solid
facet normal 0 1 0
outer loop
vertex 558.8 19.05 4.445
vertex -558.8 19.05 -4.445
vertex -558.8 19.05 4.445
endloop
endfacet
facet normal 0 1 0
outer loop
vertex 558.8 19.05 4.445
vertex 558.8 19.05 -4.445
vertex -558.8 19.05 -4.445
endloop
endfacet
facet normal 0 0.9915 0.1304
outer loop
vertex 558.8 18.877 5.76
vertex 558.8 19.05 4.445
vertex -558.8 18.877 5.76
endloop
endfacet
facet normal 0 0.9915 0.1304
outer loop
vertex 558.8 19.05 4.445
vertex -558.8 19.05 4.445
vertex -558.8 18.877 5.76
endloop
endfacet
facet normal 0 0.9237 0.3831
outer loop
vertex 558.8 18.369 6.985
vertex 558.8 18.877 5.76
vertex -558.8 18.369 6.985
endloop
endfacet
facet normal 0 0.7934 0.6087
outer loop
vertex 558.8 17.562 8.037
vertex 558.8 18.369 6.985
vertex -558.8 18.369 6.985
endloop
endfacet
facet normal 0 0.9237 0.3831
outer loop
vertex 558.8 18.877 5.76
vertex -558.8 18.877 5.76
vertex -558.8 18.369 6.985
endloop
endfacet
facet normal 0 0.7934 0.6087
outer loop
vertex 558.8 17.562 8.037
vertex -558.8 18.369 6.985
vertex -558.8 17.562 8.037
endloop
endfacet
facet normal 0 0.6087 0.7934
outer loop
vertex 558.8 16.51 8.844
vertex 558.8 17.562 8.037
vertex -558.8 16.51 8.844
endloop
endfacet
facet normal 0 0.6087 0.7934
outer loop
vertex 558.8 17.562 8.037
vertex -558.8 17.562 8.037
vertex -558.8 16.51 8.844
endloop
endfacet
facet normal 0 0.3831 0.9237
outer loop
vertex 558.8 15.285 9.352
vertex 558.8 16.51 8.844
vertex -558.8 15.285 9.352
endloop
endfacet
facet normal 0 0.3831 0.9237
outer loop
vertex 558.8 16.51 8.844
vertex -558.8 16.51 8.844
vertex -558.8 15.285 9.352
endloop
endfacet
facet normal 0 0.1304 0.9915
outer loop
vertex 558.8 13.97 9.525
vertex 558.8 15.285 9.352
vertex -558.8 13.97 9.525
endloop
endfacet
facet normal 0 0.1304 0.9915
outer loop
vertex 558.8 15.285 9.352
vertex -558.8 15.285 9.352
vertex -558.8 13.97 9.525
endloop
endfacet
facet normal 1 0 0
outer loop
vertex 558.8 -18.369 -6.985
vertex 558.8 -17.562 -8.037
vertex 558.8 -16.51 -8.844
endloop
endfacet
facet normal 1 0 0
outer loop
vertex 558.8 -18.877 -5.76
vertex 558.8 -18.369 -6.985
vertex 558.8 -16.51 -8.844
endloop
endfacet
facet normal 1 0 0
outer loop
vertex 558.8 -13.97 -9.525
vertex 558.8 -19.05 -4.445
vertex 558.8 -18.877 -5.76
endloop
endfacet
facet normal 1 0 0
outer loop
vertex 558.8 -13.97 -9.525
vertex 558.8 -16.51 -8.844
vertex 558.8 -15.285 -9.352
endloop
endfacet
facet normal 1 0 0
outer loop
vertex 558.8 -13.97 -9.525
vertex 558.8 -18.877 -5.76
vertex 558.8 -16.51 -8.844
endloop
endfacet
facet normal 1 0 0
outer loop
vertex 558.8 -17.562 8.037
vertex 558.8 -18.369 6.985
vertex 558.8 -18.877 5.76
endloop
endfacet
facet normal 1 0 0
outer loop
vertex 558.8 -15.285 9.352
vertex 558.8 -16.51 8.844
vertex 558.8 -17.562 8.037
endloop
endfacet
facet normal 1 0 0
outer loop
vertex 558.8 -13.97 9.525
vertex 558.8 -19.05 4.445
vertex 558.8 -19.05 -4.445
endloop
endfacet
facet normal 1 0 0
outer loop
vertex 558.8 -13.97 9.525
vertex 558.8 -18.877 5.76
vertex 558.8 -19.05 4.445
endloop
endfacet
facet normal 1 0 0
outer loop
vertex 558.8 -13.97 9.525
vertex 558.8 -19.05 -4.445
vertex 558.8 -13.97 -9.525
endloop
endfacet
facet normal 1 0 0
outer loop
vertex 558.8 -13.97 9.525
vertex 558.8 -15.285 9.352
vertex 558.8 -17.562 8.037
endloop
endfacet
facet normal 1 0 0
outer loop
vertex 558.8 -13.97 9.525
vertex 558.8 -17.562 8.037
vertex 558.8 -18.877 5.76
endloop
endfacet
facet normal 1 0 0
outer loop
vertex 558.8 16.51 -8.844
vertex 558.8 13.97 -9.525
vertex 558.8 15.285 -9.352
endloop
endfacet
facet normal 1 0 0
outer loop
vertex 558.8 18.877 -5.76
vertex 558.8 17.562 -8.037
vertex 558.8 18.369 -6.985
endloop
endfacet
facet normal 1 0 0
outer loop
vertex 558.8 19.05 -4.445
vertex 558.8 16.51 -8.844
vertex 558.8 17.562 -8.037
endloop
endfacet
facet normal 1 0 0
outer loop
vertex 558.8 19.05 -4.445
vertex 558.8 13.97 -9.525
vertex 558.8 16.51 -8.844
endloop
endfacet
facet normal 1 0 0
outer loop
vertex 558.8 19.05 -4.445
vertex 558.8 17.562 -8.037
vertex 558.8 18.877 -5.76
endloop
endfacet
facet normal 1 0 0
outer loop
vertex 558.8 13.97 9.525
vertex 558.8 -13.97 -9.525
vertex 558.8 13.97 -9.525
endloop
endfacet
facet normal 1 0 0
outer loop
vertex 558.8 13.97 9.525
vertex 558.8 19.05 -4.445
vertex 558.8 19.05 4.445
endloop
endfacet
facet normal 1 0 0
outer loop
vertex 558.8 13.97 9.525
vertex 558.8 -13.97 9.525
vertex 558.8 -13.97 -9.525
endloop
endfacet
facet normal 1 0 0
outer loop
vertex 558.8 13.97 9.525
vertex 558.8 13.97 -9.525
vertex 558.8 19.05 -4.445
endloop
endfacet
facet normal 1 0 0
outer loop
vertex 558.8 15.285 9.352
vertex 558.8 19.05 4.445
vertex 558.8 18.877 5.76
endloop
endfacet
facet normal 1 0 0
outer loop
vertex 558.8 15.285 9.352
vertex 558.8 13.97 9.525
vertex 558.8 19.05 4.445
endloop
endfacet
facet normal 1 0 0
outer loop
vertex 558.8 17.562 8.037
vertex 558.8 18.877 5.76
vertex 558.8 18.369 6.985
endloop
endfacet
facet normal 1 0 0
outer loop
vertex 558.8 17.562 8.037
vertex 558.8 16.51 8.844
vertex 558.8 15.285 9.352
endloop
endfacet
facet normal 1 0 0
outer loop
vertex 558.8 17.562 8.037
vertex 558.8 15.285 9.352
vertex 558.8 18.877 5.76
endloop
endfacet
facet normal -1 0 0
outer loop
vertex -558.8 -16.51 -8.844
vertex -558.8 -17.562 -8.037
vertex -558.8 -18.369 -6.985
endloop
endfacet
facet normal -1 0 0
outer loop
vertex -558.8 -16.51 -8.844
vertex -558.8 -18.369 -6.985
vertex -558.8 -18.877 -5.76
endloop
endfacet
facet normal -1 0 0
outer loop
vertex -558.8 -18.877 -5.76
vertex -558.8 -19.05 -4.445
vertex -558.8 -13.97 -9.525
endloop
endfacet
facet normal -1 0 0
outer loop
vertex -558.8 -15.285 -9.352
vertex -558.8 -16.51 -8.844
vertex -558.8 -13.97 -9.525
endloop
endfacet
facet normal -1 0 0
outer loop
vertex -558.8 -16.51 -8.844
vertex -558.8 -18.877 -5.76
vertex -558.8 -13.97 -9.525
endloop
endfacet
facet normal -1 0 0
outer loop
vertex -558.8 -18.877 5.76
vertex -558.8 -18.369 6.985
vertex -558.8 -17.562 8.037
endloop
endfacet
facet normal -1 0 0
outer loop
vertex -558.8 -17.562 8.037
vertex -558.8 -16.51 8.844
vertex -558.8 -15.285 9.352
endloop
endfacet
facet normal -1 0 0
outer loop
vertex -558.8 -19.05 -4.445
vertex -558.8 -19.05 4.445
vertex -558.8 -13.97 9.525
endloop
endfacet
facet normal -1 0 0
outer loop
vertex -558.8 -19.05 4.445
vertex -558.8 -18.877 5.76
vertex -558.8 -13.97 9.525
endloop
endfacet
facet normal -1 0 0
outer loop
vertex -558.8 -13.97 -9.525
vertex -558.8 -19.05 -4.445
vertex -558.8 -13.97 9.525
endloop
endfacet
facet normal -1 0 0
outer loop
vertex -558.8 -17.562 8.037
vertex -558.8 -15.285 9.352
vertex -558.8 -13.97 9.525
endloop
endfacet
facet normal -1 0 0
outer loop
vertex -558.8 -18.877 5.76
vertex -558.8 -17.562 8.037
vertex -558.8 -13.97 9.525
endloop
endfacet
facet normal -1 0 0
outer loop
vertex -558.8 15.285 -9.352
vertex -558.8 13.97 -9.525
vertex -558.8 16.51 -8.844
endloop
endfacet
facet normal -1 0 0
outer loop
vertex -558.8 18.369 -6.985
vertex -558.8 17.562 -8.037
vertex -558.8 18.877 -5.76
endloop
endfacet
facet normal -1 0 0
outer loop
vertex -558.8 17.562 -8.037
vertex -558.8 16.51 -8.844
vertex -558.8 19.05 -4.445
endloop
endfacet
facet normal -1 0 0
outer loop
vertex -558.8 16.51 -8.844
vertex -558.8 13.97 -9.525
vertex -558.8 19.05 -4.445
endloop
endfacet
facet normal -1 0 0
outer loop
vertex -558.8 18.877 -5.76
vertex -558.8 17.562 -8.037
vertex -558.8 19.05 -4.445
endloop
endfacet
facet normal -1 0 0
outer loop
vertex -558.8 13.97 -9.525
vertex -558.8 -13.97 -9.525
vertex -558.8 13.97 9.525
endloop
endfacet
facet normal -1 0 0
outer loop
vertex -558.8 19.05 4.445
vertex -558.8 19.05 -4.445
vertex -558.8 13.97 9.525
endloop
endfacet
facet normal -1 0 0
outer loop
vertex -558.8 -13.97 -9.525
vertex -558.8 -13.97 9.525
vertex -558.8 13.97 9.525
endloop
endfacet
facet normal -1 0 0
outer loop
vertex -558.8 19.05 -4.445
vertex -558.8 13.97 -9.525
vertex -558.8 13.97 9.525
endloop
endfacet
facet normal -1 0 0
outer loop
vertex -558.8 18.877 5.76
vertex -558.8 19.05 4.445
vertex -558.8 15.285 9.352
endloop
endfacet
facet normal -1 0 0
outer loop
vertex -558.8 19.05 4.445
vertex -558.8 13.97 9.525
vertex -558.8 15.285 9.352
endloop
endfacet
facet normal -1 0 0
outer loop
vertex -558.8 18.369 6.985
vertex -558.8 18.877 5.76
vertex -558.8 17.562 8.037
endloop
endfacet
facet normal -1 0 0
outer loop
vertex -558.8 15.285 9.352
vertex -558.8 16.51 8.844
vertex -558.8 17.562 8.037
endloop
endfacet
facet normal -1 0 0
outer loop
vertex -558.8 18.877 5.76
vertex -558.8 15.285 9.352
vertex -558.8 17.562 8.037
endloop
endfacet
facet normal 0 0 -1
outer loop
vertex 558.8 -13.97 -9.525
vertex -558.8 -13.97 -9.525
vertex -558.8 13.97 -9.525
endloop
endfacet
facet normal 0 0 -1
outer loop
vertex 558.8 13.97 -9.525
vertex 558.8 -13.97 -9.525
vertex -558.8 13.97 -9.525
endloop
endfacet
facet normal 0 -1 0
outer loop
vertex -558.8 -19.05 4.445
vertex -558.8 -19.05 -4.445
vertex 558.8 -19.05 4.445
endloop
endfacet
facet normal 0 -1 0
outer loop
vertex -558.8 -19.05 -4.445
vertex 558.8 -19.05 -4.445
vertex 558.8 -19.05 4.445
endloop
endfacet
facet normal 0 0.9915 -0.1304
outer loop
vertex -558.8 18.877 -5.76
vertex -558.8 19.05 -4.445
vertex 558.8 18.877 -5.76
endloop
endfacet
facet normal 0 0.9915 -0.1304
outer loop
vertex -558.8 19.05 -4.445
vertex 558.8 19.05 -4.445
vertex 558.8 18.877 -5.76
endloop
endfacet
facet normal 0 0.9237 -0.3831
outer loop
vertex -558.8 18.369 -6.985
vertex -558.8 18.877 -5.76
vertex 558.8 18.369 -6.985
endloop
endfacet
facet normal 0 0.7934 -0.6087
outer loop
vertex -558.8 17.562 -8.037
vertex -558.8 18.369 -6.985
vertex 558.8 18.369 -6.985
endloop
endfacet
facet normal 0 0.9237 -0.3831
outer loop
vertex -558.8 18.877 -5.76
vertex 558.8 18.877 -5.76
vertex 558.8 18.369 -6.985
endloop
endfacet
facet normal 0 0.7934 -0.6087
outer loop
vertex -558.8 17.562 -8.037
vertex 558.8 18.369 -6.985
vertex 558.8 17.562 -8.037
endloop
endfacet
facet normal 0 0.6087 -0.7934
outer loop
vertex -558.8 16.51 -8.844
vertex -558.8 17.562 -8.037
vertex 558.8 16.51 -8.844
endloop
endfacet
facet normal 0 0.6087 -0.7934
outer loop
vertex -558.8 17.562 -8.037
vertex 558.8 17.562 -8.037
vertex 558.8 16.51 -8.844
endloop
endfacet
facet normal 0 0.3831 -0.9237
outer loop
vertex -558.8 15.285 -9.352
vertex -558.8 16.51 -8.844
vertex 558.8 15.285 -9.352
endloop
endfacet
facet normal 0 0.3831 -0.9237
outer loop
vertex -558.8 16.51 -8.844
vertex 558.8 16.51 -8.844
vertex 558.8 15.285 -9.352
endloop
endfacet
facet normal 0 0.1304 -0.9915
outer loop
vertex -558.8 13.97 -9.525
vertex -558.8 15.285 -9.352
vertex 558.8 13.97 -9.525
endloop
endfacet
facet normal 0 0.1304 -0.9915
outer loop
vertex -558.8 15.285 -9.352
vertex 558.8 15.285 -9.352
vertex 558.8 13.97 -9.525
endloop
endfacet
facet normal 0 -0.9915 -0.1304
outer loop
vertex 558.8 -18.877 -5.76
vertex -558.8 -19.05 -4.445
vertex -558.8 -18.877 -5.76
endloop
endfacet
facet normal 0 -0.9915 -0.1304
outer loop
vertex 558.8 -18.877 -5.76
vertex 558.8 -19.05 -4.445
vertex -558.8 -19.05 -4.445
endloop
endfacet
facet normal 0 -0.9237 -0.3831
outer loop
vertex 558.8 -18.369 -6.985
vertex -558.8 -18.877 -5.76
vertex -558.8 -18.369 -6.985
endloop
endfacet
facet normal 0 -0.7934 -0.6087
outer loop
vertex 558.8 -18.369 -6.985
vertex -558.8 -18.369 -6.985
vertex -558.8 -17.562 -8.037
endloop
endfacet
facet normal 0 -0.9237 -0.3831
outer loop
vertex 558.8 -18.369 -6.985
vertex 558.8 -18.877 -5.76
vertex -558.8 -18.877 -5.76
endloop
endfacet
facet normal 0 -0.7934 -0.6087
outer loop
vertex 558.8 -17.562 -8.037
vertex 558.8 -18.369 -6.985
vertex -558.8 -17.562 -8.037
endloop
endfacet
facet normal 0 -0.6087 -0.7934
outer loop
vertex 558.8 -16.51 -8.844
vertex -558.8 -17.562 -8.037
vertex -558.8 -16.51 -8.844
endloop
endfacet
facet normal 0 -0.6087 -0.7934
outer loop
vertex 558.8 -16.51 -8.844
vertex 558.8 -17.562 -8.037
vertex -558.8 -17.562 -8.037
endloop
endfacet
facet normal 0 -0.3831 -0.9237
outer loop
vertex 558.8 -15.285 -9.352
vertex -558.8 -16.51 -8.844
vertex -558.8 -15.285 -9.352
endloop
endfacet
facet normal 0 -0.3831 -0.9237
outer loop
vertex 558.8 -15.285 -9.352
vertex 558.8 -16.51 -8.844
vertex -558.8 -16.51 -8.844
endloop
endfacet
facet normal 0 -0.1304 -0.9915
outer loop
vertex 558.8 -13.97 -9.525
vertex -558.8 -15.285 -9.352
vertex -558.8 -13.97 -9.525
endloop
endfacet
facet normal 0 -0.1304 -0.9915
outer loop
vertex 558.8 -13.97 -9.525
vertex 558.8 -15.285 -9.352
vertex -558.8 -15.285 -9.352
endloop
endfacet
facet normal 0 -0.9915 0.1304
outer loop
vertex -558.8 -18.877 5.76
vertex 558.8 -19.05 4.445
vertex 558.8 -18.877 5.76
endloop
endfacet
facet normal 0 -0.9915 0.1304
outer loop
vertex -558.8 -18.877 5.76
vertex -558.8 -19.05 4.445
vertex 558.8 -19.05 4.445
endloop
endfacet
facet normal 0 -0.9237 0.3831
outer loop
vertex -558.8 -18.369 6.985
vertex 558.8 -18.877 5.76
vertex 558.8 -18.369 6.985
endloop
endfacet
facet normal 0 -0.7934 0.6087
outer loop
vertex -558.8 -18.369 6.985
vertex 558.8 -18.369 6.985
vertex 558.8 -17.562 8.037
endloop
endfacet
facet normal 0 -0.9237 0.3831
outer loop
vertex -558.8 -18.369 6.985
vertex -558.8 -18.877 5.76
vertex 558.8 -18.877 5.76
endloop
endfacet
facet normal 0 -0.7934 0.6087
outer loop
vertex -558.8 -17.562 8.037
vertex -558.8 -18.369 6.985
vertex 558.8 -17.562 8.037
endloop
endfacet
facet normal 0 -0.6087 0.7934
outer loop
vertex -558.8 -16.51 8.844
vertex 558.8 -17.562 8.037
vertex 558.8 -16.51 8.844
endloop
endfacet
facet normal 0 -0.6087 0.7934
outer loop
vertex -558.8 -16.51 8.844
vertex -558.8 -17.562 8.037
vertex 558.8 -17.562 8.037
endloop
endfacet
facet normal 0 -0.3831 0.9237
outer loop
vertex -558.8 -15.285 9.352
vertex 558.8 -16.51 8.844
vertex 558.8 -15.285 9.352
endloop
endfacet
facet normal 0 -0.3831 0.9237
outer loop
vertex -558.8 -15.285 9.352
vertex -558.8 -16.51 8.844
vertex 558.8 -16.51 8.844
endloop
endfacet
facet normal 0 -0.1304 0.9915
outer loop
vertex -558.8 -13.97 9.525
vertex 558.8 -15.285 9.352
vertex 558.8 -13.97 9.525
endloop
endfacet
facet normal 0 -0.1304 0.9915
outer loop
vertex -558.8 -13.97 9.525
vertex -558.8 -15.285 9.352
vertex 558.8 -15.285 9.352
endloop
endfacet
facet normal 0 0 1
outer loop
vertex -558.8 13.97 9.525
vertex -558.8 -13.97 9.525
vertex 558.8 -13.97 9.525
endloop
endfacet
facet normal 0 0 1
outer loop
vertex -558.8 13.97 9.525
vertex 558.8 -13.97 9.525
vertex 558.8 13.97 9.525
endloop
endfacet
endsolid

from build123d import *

# Parameters (mm, degrees)
F0_W     = 38.1
F0_H     = 19.05
F1_DEPTH = 558.8
F2_R     = 5.08


with BuildPart() as f1:
    # F0 (on Right) → F1 (new body, symmetric)
    with BuildSketch(Plane.YZ):
        Rectangle(F0_W, F0_H)
    extrude(amount=F1_DEPTH, both=True)

    # F2
    f2_edges = [f1.edges().sort_by_distance(p)[0] for p in [
        (0, -19.05, 9.525),
        (0, -19.05, -9.525),
        (0, 19.05, 9.525),
        (0, 19.05, -9.525),
    ]]
    fillet(f2_edges, radius=F2_R)


solid = f1.part
